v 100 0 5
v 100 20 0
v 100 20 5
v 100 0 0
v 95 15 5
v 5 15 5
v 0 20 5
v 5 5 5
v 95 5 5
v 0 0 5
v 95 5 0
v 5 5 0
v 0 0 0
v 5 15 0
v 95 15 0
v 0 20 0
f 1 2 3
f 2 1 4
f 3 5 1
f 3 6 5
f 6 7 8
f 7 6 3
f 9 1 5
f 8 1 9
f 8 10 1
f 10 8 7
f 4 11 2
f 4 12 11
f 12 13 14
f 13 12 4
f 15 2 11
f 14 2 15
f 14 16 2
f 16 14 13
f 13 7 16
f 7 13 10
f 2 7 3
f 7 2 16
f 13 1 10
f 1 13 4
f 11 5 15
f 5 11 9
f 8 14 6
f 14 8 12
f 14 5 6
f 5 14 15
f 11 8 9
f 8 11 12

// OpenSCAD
// EcoNote+ Display Mount Frame
$fn=60;
difference() {
  cube([100, 20, 5]);
  translate([5, 5, -1]) cube([90, 10, 7]);
}
